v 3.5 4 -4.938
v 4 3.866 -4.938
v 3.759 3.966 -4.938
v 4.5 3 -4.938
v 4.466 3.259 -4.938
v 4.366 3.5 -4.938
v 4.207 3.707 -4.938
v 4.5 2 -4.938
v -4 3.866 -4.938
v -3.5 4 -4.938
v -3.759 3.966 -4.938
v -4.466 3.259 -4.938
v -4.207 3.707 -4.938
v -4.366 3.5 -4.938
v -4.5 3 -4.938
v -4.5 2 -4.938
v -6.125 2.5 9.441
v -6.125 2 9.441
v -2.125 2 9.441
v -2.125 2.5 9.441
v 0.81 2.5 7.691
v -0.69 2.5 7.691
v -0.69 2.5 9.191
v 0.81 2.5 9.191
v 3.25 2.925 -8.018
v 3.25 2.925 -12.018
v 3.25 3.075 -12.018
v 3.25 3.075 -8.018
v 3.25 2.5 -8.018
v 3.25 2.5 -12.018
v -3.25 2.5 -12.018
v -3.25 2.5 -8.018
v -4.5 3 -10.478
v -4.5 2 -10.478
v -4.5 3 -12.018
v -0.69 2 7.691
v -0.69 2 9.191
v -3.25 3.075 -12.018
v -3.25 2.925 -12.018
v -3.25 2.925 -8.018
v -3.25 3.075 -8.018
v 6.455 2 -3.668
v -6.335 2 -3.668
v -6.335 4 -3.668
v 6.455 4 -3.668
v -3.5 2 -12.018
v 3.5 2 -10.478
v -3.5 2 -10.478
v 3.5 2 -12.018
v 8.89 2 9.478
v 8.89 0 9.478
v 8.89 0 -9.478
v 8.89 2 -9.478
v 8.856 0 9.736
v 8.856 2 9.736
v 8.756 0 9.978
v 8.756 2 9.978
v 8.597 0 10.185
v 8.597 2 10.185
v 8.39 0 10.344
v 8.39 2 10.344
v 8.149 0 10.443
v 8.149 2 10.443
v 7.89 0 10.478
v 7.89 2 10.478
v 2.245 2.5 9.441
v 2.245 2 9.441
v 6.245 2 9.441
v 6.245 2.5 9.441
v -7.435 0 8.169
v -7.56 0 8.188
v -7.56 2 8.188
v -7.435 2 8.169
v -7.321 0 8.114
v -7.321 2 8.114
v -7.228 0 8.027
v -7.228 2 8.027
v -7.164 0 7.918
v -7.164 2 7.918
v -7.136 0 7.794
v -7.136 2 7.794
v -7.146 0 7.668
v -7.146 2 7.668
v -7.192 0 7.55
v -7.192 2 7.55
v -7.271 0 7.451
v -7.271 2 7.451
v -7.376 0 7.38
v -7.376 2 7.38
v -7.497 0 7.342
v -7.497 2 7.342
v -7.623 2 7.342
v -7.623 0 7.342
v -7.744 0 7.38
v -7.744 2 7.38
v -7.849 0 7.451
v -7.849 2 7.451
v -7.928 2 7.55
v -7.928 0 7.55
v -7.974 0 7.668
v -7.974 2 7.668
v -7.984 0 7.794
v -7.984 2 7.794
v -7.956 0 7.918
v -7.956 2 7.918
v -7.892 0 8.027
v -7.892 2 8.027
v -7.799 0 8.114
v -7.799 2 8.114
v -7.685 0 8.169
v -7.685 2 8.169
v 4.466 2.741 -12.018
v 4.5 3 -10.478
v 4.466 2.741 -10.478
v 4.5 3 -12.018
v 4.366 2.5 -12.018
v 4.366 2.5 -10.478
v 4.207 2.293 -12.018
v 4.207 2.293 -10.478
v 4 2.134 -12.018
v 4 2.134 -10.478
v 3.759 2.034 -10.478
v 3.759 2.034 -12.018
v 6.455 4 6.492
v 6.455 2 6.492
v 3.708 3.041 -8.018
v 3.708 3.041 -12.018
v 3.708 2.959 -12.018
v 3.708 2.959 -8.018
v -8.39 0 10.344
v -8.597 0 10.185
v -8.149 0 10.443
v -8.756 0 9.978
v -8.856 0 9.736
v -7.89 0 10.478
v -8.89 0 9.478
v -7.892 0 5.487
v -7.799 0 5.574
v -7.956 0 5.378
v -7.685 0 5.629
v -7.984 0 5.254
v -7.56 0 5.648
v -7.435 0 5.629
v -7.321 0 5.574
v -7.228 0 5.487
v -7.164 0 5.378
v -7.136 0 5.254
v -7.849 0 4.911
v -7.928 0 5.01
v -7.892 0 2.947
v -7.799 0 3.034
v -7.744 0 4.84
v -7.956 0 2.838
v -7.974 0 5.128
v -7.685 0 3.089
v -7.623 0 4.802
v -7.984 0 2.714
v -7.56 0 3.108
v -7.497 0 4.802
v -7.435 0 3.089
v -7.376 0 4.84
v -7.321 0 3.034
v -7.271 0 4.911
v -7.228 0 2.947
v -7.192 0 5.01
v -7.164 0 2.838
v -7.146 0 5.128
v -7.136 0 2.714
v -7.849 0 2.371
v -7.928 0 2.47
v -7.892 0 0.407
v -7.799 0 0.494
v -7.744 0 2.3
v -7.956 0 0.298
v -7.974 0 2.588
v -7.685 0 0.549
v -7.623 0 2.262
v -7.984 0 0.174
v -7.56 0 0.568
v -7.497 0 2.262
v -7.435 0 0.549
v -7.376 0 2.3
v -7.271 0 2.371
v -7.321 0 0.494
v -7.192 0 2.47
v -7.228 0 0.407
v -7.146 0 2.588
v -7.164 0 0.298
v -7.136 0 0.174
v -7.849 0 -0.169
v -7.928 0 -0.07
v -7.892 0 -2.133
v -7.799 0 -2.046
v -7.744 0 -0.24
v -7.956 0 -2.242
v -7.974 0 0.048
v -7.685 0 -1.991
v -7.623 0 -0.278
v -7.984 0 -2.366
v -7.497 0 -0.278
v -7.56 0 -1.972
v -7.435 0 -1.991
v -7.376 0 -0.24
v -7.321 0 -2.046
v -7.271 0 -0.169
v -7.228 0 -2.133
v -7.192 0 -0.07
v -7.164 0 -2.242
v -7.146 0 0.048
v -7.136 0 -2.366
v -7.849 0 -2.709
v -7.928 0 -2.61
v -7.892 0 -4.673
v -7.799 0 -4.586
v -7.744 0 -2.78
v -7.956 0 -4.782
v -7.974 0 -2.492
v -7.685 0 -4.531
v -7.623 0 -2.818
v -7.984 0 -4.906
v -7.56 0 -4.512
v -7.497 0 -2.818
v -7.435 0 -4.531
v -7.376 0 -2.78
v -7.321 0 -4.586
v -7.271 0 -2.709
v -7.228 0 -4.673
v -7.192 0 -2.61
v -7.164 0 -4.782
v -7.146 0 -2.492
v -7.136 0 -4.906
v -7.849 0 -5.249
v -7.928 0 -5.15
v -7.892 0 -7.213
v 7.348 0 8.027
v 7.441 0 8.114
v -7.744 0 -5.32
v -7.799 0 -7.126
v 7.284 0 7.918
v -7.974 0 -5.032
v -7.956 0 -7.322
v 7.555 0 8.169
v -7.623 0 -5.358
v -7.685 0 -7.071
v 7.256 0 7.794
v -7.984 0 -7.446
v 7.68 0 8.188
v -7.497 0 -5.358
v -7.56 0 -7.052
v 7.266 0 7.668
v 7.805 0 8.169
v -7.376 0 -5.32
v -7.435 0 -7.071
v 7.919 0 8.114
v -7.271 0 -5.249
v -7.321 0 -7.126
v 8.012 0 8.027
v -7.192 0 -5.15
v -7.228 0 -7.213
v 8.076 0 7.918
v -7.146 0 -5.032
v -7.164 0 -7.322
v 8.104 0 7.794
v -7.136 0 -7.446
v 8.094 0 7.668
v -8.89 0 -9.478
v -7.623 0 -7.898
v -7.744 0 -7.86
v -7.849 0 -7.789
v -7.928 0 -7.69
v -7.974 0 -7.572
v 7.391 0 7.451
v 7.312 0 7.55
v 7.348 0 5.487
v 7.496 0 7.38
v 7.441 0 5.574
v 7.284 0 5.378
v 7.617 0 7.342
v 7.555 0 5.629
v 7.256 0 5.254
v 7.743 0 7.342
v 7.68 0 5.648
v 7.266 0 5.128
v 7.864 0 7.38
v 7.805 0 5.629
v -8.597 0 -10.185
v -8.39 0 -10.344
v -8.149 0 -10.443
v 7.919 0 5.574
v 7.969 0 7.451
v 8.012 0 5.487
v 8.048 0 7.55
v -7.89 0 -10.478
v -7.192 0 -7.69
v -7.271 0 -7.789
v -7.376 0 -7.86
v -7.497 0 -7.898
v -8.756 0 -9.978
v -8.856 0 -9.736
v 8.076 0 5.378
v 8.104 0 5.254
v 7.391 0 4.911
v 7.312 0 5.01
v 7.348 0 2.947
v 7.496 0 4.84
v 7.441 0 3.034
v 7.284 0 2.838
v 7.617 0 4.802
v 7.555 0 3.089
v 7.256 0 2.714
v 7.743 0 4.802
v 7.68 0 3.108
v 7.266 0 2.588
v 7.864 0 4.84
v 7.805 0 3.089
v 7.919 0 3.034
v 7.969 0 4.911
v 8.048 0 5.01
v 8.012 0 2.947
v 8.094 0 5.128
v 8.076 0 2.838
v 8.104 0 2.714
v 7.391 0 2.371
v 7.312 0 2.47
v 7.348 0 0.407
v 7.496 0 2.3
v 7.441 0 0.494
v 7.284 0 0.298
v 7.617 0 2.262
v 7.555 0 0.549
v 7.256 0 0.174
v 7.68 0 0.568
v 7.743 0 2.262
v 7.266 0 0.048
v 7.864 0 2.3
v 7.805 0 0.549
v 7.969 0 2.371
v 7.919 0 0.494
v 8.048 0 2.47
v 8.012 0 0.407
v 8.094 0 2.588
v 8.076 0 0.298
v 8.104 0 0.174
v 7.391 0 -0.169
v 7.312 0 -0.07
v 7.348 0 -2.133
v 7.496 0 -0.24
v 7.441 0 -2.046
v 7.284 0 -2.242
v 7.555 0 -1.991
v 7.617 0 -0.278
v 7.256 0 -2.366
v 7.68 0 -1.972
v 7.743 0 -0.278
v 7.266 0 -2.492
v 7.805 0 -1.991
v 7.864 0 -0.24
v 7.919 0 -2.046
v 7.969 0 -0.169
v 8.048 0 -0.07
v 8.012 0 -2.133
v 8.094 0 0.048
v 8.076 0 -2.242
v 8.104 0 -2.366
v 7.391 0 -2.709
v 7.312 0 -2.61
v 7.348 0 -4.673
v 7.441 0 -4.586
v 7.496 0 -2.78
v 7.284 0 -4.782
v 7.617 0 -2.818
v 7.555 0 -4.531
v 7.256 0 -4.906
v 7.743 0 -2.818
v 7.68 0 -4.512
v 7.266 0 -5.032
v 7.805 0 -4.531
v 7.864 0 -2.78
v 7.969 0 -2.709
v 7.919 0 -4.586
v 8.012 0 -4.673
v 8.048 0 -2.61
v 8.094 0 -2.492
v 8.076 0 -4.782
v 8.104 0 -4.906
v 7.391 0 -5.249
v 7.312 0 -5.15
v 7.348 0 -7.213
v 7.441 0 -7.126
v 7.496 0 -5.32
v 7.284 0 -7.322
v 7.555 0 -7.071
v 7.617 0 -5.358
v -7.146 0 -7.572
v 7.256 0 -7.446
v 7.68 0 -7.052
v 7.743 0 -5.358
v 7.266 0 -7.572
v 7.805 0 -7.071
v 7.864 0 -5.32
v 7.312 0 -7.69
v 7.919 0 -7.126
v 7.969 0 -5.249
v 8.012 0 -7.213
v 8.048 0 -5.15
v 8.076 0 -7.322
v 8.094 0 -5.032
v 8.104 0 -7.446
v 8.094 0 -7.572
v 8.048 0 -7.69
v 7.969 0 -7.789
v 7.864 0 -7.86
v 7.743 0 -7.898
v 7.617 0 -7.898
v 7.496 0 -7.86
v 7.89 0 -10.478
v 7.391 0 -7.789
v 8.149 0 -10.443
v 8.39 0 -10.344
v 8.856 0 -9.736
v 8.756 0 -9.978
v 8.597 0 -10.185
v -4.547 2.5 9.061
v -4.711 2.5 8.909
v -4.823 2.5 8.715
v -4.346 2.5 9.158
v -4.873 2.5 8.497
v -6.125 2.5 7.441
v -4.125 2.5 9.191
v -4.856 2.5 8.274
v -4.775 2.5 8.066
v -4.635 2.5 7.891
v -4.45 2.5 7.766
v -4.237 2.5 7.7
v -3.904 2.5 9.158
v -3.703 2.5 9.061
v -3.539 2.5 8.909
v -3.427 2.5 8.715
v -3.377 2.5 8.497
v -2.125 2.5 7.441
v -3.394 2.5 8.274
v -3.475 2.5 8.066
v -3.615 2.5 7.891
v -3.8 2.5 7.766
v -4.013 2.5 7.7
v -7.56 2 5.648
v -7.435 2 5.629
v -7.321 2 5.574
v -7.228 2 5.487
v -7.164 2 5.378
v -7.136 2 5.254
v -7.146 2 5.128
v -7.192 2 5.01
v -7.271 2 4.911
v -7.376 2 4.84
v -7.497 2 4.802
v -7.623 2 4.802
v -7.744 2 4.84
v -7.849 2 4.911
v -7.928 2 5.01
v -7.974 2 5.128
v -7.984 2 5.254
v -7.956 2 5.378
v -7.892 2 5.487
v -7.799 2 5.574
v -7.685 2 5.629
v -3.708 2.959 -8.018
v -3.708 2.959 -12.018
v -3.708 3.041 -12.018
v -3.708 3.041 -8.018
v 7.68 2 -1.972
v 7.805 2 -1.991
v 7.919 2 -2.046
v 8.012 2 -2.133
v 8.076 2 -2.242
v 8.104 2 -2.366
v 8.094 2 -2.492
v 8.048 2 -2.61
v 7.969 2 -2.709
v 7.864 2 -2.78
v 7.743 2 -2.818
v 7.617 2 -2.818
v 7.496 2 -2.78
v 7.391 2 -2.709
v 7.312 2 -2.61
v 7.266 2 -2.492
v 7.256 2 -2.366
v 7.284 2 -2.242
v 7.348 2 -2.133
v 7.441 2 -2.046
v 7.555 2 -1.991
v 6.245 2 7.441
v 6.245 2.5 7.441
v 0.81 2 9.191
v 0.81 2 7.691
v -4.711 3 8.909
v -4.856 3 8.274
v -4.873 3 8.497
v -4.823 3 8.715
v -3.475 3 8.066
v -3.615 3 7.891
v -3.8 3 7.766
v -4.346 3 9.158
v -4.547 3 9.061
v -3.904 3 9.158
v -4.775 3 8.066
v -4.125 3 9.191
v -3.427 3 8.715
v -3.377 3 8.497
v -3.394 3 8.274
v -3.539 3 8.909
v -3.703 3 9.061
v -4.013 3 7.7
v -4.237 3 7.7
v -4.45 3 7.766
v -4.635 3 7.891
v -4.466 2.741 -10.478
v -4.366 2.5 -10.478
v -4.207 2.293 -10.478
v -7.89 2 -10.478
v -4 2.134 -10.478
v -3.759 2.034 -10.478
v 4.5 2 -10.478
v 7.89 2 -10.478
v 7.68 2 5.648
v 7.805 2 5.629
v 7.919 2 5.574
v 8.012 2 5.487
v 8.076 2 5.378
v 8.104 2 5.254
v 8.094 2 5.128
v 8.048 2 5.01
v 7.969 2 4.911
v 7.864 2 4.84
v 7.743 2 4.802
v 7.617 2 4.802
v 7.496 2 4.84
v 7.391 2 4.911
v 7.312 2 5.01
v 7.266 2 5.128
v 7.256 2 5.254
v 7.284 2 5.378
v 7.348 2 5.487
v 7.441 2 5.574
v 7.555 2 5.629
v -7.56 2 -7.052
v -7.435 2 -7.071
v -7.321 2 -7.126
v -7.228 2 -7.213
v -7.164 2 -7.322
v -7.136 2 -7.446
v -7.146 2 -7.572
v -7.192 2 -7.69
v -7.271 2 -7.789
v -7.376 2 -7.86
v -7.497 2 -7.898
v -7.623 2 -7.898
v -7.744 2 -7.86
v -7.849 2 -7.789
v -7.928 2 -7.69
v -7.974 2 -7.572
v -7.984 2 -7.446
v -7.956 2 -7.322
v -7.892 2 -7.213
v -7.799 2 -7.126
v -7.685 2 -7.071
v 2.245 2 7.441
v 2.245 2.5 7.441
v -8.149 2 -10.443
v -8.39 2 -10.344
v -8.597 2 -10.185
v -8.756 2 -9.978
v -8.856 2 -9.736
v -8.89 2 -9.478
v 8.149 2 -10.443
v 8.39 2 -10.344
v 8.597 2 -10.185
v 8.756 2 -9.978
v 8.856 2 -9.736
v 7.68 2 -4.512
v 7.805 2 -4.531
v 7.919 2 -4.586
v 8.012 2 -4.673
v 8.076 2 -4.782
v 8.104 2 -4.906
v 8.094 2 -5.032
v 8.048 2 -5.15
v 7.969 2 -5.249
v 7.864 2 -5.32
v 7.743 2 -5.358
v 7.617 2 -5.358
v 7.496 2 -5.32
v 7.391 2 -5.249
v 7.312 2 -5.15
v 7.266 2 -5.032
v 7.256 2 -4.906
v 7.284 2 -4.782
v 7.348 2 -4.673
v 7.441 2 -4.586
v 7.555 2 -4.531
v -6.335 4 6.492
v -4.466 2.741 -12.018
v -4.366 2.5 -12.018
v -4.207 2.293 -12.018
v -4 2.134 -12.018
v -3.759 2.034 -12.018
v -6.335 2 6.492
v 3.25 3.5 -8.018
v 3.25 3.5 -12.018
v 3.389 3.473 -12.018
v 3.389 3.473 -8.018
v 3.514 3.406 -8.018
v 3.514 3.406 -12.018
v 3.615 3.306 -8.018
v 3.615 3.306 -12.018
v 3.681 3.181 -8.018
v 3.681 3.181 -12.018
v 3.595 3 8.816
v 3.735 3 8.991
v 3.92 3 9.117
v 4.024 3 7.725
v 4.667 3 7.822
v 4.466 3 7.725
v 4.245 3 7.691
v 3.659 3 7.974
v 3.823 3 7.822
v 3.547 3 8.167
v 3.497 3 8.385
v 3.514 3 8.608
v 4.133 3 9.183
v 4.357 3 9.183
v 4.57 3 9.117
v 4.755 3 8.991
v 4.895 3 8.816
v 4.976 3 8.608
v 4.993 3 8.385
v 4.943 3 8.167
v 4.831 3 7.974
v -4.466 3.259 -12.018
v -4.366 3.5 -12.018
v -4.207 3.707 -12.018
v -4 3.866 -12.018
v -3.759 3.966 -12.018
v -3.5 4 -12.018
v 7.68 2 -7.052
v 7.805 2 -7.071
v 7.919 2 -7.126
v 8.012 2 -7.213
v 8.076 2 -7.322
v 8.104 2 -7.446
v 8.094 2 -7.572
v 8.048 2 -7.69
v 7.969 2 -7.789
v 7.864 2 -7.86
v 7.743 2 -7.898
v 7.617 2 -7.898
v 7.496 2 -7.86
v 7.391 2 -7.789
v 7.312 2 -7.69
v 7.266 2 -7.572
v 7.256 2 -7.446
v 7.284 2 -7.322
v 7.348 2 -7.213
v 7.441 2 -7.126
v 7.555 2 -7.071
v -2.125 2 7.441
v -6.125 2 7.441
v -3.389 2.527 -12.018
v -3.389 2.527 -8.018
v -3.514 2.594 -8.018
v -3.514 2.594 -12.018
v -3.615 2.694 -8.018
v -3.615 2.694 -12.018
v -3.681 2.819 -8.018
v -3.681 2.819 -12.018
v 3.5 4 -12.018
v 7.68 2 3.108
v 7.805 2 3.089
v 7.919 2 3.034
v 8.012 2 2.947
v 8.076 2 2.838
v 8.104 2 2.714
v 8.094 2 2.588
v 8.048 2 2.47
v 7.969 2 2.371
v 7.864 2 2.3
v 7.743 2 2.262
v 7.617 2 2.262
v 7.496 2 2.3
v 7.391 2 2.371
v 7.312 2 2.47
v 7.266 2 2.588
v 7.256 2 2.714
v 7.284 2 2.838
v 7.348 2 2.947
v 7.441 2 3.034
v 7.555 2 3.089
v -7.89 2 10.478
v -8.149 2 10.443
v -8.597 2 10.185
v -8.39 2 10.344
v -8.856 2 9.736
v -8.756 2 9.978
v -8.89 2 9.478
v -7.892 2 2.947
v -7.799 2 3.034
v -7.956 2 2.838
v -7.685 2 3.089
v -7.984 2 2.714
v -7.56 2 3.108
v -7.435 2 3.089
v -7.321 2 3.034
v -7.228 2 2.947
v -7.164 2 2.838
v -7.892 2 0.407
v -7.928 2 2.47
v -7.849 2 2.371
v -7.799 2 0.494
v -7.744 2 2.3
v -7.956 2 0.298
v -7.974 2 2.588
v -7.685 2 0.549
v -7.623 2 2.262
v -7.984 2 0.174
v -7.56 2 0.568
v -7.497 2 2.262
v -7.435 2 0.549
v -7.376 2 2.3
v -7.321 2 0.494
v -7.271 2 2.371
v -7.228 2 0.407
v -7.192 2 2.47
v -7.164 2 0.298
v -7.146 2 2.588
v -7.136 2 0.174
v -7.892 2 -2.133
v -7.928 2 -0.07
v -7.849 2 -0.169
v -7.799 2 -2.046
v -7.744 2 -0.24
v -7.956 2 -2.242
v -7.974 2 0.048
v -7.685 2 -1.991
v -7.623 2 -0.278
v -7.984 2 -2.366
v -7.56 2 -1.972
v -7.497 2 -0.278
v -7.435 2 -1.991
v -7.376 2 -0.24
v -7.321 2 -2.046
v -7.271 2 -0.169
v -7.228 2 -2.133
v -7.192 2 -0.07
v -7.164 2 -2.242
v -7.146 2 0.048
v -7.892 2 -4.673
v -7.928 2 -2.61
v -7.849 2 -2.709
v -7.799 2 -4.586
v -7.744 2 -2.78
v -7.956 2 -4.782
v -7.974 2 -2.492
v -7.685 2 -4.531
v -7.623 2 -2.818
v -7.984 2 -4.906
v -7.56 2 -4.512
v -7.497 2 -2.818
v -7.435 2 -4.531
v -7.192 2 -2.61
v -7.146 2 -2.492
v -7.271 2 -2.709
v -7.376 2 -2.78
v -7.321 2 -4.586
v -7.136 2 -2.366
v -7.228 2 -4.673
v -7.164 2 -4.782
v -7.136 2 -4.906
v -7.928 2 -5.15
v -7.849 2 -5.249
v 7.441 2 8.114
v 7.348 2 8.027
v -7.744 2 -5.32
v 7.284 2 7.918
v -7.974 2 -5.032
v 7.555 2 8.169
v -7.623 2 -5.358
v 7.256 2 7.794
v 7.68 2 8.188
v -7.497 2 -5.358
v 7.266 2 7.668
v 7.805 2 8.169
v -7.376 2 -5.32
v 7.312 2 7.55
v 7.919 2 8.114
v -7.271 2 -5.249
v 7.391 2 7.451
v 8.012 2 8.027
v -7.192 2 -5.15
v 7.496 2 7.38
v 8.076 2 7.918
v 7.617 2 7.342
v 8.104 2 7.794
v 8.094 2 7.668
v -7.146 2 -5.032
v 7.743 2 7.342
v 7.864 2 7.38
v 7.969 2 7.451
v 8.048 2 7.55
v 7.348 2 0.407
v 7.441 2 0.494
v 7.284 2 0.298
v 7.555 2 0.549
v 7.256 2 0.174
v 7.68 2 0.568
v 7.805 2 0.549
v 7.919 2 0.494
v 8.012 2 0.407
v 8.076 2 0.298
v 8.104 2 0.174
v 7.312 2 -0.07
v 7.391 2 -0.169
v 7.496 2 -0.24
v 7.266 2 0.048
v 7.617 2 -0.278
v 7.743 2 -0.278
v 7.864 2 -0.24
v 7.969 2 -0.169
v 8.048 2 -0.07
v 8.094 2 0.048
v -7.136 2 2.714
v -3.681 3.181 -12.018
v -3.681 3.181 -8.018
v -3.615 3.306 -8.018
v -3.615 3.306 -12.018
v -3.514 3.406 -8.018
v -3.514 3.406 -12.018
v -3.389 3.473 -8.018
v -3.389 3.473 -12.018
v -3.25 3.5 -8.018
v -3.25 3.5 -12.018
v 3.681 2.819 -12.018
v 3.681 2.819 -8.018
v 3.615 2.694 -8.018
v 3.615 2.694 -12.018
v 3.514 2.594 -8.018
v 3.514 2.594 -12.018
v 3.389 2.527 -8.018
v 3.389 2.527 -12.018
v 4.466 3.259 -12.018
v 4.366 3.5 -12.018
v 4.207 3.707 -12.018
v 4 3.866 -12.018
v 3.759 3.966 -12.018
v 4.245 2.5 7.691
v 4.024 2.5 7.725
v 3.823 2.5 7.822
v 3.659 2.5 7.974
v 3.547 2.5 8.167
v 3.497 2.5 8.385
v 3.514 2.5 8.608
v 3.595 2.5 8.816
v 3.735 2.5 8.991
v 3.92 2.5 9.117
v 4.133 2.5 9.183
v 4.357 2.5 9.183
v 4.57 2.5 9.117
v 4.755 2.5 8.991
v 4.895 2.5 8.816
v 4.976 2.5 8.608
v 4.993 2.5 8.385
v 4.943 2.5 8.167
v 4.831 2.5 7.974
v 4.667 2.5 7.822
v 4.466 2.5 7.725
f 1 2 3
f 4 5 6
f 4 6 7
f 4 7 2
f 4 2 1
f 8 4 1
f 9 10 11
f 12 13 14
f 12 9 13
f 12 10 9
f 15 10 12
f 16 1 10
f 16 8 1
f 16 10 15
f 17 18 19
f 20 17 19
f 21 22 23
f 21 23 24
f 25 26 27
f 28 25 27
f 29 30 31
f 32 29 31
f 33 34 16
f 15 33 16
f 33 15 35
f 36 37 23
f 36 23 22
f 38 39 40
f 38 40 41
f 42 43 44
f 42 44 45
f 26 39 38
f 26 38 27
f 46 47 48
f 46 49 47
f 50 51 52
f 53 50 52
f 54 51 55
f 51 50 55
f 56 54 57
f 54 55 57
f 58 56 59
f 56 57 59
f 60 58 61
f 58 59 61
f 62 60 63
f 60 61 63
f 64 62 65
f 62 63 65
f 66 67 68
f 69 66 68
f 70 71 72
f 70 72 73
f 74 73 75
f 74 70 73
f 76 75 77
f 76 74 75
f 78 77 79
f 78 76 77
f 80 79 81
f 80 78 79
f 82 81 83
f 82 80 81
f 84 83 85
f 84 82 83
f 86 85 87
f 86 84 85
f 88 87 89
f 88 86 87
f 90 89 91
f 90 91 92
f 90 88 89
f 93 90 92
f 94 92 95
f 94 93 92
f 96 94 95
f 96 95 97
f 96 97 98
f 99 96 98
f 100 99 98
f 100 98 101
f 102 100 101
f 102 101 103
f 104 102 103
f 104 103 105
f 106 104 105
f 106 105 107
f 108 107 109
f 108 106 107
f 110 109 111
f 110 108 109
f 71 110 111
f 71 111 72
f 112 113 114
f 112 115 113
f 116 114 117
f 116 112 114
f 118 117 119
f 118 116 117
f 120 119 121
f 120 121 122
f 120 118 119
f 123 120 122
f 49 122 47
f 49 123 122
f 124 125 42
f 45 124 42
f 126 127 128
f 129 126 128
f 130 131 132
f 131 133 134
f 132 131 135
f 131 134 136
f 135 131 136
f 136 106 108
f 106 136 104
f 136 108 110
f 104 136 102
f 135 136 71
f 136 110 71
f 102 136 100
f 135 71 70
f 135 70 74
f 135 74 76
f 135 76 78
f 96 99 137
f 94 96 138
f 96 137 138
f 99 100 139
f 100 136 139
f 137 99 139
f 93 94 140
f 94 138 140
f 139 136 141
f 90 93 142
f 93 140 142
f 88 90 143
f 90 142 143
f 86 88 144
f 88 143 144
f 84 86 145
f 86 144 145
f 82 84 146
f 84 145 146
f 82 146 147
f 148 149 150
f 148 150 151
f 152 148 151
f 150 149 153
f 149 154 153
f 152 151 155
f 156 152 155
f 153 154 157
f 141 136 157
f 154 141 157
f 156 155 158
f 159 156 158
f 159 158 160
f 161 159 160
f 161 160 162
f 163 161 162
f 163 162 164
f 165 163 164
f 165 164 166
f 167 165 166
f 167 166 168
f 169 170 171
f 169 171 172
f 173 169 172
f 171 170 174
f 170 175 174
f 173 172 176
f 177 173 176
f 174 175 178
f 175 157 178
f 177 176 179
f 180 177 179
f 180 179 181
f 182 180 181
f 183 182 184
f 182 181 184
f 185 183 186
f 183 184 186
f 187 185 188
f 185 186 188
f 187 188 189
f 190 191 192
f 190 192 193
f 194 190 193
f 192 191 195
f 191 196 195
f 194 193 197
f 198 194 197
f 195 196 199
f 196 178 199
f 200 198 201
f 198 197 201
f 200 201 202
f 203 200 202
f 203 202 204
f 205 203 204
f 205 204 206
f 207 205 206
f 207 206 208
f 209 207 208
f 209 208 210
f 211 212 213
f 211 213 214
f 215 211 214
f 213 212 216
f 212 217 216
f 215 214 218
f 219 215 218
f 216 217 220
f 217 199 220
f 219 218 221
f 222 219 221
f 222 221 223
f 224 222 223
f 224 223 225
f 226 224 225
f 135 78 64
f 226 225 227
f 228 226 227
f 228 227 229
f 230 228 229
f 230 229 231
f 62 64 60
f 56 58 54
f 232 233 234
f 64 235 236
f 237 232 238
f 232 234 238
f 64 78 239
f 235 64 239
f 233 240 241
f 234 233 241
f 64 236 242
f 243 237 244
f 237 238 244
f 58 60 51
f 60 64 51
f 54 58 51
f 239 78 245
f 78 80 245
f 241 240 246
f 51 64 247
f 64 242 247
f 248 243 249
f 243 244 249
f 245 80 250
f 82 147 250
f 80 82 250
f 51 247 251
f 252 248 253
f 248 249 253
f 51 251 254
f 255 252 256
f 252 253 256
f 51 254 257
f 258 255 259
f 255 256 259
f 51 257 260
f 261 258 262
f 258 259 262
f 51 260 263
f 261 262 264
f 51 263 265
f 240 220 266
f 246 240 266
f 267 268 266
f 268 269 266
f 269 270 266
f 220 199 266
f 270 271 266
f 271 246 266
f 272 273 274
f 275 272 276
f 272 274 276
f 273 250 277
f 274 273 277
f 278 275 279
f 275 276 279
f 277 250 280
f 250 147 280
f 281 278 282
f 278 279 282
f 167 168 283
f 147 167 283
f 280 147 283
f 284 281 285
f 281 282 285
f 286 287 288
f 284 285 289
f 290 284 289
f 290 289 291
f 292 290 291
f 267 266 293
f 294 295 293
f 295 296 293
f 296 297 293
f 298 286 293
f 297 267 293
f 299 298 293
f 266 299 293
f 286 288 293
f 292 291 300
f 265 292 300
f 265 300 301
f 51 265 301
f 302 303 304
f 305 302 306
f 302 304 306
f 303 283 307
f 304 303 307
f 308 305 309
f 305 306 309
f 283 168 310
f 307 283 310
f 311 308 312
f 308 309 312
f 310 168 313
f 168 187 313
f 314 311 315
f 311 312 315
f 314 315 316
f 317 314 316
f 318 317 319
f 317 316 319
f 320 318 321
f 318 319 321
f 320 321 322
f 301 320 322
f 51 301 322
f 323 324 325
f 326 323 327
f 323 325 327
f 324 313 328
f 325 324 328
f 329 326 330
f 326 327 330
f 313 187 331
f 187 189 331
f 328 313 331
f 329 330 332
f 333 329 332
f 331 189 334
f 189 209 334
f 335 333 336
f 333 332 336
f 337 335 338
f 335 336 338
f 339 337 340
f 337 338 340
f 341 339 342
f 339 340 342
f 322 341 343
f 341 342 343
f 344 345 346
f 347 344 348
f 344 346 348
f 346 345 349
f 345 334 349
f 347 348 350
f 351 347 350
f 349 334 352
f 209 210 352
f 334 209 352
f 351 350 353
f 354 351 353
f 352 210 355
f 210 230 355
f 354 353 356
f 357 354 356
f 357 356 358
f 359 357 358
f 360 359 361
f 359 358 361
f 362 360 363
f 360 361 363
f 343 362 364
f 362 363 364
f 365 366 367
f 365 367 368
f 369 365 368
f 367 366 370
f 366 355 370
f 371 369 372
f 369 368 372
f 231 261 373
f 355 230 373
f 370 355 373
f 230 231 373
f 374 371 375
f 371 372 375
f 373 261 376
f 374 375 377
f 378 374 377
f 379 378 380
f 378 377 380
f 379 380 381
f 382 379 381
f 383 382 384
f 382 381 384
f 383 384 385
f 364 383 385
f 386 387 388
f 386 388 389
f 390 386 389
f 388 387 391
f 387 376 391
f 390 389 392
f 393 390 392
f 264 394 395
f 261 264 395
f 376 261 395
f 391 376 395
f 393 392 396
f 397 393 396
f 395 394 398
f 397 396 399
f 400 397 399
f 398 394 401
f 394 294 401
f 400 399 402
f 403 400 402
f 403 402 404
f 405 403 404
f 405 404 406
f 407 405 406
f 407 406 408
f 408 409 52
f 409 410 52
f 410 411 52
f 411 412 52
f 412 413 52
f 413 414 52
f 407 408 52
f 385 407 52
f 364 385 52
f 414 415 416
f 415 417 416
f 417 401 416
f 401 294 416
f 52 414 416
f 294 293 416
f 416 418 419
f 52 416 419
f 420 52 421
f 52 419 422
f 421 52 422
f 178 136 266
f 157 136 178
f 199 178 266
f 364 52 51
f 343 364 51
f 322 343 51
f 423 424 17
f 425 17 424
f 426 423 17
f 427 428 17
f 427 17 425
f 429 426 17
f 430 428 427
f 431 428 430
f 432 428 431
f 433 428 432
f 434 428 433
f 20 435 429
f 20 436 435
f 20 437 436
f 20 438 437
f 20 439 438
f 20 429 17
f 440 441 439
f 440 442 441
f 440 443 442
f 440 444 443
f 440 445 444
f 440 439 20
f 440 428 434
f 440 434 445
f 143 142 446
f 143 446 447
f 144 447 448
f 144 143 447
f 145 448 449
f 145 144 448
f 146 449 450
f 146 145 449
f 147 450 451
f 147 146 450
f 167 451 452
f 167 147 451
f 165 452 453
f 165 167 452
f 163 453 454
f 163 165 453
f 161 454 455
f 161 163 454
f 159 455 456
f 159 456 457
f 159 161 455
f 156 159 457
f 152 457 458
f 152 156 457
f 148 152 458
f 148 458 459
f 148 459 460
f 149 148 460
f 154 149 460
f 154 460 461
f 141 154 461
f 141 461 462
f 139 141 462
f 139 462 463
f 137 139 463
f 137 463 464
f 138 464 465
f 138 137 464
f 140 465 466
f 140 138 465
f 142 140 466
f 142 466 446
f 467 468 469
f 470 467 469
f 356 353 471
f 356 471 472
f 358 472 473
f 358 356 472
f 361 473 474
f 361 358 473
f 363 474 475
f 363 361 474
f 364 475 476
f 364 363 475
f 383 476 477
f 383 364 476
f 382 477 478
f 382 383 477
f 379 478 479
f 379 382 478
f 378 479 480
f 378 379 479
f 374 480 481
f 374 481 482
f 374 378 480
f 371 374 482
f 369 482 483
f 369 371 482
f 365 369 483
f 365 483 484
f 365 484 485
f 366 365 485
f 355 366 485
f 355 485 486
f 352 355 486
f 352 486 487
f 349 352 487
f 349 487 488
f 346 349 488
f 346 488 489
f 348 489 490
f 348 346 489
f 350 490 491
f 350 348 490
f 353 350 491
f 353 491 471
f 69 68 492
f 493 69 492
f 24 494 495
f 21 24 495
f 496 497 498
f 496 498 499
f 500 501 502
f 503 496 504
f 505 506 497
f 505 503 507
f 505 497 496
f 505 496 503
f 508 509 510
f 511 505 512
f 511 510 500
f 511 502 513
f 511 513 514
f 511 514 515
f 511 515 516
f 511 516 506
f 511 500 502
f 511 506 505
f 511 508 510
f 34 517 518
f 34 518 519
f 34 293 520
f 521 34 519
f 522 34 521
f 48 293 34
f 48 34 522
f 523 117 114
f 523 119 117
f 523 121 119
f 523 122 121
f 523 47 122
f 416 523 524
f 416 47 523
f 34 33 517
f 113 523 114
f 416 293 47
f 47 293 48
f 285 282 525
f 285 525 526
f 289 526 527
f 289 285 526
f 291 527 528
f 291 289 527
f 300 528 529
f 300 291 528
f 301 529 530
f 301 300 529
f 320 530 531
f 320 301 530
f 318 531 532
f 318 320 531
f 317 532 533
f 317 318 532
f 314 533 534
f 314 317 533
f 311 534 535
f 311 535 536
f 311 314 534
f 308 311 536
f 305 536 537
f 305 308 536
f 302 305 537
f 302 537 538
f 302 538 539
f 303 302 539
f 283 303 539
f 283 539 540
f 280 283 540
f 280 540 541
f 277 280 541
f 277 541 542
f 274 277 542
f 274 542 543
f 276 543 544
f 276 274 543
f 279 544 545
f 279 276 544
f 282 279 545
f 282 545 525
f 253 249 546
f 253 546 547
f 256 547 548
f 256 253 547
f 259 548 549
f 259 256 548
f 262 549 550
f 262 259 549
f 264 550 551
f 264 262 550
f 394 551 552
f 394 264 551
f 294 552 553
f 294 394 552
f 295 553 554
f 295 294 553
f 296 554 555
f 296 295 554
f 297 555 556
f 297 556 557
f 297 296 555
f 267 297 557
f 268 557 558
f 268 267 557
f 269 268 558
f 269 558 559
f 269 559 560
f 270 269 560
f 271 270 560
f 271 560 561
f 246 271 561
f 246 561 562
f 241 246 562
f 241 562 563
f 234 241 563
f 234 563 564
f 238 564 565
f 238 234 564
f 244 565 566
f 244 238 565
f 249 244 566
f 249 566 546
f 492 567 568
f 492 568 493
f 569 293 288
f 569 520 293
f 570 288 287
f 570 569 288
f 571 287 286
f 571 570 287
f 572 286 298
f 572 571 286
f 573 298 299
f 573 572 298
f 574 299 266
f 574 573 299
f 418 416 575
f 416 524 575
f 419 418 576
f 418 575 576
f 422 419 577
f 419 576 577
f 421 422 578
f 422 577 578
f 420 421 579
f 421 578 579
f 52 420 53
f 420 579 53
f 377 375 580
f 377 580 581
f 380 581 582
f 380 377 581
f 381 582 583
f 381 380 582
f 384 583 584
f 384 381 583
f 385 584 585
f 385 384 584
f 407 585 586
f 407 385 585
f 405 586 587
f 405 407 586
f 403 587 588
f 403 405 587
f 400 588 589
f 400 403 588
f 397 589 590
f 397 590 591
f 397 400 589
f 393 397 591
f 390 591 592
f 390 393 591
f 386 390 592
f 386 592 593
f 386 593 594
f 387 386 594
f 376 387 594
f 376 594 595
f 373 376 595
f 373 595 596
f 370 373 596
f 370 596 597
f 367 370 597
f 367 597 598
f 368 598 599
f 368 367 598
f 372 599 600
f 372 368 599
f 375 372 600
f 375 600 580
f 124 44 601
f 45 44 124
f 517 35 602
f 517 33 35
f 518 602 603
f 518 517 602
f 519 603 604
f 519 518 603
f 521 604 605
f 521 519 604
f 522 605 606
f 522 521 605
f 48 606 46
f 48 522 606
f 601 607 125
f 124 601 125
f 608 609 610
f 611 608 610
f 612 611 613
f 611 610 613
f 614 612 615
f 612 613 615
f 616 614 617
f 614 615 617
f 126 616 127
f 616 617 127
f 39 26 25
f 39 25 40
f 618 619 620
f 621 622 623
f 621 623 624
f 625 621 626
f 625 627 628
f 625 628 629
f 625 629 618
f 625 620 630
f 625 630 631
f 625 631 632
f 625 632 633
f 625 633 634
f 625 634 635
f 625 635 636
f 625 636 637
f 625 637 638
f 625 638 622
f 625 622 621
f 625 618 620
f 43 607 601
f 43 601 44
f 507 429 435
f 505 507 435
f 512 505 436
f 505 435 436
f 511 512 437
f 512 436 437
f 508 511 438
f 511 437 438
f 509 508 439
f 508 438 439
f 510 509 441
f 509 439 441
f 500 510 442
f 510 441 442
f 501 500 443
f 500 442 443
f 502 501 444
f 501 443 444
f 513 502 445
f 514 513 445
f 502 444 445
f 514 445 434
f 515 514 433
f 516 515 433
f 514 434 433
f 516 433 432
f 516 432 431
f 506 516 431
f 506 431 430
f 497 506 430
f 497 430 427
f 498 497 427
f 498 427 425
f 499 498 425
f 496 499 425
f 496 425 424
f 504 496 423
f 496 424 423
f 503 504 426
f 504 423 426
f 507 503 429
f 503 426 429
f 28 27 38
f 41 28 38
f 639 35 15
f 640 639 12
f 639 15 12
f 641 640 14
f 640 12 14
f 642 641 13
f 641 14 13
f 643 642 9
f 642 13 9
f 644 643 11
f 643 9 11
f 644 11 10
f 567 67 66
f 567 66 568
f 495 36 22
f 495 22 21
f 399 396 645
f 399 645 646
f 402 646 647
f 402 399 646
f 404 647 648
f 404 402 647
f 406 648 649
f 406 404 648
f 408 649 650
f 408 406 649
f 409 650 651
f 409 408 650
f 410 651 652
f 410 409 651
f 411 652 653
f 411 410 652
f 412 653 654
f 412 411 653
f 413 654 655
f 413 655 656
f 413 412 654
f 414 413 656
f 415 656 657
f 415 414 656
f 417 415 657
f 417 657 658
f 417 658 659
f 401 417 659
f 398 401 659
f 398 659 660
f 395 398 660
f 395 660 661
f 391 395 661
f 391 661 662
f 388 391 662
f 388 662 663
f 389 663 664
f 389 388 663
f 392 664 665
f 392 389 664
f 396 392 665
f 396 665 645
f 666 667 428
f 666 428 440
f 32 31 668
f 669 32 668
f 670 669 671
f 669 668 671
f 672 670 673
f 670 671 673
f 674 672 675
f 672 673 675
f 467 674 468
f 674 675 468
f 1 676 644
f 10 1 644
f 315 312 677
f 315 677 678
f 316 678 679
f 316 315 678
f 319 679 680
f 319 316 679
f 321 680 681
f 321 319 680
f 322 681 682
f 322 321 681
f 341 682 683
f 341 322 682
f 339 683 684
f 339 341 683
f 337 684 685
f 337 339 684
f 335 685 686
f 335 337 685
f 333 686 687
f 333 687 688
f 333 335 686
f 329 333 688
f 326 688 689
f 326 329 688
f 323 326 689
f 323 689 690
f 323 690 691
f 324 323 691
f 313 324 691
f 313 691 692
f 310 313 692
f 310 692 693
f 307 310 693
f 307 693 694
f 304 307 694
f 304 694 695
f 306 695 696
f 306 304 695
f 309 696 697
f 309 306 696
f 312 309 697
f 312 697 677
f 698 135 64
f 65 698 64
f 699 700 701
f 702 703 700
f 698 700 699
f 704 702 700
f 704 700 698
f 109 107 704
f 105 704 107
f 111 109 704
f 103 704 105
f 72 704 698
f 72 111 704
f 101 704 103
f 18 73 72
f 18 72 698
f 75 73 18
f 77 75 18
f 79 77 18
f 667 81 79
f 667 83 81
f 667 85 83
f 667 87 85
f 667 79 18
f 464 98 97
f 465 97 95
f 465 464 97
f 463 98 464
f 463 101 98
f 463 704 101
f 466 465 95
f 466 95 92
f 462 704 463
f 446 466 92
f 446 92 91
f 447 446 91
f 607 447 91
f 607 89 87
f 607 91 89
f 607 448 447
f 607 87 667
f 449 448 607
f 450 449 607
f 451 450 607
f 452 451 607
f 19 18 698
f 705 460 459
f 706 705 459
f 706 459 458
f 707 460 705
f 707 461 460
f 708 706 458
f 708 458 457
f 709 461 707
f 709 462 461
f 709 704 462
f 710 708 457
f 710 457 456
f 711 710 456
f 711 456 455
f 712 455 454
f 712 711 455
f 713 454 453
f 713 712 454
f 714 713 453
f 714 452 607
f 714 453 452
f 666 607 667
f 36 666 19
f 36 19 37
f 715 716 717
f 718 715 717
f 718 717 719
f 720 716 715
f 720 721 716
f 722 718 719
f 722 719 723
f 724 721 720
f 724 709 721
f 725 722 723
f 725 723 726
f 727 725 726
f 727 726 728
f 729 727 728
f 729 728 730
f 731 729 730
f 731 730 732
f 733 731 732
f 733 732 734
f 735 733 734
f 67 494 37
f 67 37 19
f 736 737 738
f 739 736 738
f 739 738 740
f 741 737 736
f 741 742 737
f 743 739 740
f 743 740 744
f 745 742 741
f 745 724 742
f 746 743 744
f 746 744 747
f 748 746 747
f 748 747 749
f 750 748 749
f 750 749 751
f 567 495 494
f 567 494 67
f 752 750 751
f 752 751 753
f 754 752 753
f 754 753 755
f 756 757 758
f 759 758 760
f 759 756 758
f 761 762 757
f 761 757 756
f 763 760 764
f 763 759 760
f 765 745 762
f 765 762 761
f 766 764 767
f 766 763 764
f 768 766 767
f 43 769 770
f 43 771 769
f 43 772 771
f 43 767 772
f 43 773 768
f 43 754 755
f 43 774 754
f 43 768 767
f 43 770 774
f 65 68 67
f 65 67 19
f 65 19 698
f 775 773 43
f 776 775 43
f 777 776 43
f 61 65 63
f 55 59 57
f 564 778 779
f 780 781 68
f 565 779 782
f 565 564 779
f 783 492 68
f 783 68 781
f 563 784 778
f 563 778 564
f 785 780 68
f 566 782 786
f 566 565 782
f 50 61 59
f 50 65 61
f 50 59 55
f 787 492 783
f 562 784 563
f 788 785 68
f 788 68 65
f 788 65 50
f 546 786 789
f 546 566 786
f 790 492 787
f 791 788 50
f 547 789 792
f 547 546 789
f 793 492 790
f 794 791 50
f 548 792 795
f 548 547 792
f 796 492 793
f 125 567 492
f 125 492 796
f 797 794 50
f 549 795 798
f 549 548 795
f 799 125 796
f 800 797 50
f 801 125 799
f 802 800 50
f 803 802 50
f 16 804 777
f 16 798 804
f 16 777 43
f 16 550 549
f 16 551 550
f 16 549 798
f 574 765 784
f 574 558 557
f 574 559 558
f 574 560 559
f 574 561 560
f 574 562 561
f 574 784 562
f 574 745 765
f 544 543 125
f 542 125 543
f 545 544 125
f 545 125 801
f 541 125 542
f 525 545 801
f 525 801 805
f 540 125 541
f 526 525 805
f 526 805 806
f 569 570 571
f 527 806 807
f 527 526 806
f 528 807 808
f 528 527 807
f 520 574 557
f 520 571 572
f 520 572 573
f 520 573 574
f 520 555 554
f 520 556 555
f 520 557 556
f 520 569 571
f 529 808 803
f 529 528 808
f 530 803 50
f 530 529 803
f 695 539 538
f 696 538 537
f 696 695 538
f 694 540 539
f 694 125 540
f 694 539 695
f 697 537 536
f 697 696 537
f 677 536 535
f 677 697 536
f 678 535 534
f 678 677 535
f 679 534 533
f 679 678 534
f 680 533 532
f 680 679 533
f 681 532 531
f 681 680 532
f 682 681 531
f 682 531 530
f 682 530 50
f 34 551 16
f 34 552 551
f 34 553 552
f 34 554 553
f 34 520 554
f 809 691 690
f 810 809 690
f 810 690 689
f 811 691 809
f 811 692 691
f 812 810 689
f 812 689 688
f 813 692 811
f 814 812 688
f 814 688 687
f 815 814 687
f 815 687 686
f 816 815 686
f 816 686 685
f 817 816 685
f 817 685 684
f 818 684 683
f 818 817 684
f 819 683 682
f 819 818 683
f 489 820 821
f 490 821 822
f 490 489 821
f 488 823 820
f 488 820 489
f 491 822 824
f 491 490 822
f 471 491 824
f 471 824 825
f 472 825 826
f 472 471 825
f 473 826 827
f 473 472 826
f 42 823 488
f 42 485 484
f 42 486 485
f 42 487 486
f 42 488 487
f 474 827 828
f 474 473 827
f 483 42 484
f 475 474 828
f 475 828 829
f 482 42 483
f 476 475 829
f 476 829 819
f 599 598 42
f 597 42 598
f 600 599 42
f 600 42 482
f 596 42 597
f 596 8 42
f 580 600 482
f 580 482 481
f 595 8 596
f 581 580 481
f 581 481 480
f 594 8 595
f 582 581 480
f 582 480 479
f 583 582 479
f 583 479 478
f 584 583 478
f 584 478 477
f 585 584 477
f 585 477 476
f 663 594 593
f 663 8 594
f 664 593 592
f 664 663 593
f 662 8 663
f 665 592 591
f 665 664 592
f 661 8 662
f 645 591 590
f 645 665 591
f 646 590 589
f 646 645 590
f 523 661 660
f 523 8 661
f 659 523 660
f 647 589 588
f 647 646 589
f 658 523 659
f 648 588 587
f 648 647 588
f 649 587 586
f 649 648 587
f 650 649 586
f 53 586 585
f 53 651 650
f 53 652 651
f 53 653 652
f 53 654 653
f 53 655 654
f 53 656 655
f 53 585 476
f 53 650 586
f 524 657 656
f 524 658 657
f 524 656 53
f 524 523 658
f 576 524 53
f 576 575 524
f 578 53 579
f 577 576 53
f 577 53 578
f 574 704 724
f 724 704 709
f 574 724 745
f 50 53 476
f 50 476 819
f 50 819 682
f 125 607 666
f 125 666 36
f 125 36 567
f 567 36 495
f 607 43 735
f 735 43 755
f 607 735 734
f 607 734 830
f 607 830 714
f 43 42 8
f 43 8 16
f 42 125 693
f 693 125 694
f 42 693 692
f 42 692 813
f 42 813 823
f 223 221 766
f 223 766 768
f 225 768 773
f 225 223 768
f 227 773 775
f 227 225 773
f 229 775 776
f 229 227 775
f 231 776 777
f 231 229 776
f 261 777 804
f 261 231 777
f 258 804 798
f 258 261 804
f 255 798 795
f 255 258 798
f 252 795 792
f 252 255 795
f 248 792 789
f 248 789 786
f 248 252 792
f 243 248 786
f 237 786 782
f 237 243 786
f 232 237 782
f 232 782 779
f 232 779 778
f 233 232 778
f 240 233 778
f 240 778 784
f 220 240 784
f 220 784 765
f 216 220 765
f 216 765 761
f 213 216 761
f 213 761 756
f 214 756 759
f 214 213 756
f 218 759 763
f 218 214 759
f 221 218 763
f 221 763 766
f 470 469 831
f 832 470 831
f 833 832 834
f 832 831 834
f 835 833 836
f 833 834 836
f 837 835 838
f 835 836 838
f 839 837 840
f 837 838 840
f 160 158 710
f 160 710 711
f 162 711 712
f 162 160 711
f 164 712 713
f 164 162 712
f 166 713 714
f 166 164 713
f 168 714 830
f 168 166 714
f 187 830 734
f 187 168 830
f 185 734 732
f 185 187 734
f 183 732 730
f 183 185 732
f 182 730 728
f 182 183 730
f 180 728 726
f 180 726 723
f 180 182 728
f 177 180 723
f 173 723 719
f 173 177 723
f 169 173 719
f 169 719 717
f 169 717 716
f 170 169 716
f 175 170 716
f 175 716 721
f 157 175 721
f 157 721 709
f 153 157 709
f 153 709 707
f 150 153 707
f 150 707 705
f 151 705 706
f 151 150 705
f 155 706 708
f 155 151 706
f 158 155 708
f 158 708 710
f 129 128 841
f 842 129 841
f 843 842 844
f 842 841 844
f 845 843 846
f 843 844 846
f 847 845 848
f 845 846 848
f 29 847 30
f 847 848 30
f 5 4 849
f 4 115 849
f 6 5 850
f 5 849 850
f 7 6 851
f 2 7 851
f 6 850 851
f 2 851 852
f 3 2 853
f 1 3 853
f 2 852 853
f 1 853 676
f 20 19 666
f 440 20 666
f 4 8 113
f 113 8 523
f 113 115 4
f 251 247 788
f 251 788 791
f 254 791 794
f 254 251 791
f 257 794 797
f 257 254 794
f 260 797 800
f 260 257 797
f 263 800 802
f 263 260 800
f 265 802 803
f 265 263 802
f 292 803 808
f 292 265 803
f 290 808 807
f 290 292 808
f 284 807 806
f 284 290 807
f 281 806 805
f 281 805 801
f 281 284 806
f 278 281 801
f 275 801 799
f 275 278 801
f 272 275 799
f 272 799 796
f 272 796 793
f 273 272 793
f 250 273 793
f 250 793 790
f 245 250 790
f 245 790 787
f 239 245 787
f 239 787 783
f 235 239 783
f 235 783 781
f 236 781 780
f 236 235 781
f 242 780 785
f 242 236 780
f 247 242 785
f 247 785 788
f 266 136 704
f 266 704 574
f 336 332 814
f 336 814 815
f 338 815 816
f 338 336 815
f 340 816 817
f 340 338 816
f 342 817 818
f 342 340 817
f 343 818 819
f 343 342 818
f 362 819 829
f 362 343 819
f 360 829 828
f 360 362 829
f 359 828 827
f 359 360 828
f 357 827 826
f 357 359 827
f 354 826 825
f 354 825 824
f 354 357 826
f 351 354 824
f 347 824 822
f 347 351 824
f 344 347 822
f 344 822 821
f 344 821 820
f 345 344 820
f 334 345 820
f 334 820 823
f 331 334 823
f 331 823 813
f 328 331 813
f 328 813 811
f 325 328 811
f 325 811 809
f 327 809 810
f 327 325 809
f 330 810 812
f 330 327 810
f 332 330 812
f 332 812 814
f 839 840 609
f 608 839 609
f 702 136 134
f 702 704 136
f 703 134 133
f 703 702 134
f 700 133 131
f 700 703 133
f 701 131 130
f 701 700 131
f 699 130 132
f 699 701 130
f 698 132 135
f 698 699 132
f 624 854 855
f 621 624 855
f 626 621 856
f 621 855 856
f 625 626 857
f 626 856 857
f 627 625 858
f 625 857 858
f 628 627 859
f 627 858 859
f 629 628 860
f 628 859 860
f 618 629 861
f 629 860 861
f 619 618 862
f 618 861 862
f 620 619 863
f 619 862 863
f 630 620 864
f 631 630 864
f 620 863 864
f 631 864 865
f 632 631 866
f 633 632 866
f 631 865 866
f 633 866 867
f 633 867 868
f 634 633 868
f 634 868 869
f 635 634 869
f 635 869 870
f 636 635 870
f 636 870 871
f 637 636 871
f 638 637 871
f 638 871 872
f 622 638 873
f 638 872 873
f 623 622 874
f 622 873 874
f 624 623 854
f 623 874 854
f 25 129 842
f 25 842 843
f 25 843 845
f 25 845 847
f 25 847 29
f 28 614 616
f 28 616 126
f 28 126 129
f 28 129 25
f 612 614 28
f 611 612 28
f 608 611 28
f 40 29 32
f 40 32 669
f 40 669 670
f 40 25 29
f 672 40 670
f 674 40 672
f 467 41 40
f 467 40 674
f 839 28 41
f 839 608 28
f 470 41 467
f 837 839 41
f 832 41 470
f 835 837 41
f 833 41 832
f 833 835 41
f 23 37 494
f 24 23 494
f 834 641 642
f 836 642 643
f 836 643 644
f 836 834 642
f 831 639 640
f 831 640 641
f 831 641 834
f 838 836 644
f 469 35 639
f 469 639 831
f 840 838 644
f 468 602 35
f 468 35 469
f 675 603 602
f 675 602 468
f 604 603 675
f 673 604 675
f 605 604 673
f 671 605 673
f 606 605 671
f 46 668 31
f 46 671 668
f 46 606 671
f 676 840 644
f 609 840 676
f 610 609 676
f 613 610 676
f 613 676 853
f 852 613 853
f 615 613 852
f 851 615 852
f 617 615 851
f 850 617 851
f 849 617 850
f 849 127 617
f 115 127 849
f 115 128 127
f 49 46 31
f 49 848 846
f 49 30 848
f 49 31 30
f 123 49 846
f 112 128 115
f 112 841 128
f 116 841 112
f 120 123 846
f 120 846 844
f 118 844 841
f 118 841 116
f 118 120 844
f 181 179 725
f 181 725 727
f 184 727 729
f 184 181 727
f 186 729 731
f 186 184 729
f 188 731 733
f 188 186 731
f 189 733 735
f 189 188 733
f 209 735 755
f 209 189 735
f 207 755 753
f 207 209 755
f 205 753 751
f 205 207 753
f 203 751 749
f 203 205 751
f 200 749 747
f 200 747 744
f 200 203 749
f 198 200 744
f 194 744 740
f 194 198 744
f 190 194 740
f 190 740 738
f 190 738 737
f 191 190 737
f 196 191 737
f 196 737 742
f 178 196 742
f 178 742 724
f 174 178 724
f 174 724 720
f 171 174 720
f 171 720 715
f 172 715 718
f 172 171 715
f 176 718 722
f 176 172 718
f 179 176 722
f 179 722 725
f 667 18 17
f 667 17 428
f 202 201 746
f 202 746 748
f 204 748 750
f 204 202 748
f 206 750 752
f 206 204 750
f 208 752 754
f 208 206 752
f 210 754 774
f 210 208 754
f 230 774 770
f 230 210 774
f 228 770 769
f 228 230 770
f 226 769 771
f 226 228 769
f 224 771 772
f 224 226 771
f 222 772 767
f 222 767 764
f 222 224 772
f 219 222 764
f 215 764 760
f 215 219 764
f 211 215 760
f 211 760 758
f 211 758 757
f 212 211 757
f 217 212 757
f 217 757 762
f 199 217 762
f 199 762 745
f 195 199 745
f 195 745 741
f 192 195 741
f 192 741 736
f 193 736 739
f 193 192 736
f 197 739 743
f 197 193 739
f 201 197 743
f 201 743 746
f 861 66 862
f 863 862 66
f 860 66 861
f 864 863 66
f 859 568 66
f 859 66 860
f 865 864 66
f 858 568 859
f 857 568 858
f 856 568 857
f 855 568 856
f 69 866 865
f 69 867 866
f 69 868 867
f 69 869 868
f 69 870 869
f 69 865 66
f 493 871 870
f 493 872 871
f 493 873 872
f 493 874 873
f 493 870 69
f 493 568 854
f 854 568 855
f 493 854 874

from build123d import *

# Parameters (mm, degrees)
ESQUISSE1_W             = 17.78
ESQUISSE1_H             = 20.955
ESQUISSE1_R             = 0.425
BOSS_EXTRU_1_DEPTH      = 2
BOSS_EXTRU_2_DEPTH      = 2
CONG_1_R                = 1
ESQUISSE3_W             = 6.499332414
ESQUISSE3_H             = 0.15
ENL_V_MAT_EXTRU_1_DEPTH = 4
CONG_2_R                = 1
ESQUISSE4_W             = 12.79
ESQUISSE4_H             = 10.16
BOSS_EXTRU_3_DEPTH      = 2
ESQUISSE5_W             = 4
ESQUISSE5_H             = 2
ESQUISSE5_W_2           = 1.5
ESQUISSE5_H_2           = 1.5
BOSS_EXTRU_4_DEPTH      = 0.5
ESQUISSE6_R             = 0.75
BOSS_EXTRU_5_DEPTH      = 0.5


with BuildPart() as part:
    # Esquisse1 → Boss.-Extru.1 (new body)
    with BuildSketch(Plane(origin=(0, 0, 0), x_dir=(1, 0, 0), z_dir=(0, 1, 0))):
        Rectangle(ESQUISSE1_W, ESQUISSE1_H)
        with Locations(Location((-7.56, 7.4775, 0), (0, 0, 270))):
            Circle(ESQUISSE1_R, mode=Mode.SUBTRACT)
        with Locations(Location((7.68, 7.4775, 0), (0, 0, 270))):
            Circle(ESQUISSE1_R, mode=Mode.SUBTRACT)
        with Locations(Location((7.68, 4.9375, 0), (0, 0, 270))):
            Circle(ESQUISSE1_R, mode=Mode.SUBTRACT)
        with Locations(Location((7.68, 2.3975, 0), (0, 0, 270))):
            Circle(ESQUISSE1_R, mode=Mode.SUBTRACT)
        with Locations(Location((7.68, -0.1425, 0), (0, 0, 270))):
            Circle(ESQUISSE1_R, mode=Mode.SUBTRACT)
        with Locations(Location((7.68, -2.6825, 0), (0, 0, 270))):
            Circle(ESQUISSE1_R, mode=Mode.SUBTRACT)
        with Locations(Location((7.68, -5.2225, 0), (0, 0, 270))):
            Circle(ESQUISSE1_R, mode=Mode.SUBTRACT)
        with Locations(Location((7.68, -7.7625, 0), (0, 0, 270))):
            Circle(ESQUISSE1_R, mode=Mode.SUBTRACT)
        with Locations(Location((-7.56, 4.9375, 0), (0, 0, 270))):
            Circle(ESQUISSE1_R, mode=Mode.SUBTRACT)
        with Locations(Location((-7.56, 2.3975, 0), (0, 0, 270))):
            Circle(ESQUISSE1_R, mode=Mode.SUBTRACT)
        with Locations(Location((-7.56, -0.1425, 0), (0, 0, 270))):
            Circle(ESQUISSE1_R, mode=Mode.SUBTRACT)
        with Locations(Location((-7.56, -2.6825, 0), (0, 0, 270))):
            Circle(ESQUISSE1_R, mode=Mode.SUBTRACT)
        with Locations(Location((-7.56, -5.2225, 0), (0, 0, 270))):
            Circle(ESQUISSE1_R, mode=Mode.SUBTRACT)
        with Locations(Location((-7.56, -7.7625, 0), (0, 0, 270))):
            Circle(ESQUISSE1_R, mode=Mode.SUBTRACT)
    extrude(amount=BOSS_EXTRU_1_DEPTH)

    # Esquisse2 → Boss.-Extru.2 (add)
    with BuildSketch(Plane(origin=(0, 2, 0), x_dir=(1, 0, 0), z_dir=(0, 1, 0))):
        Polygon((-4.5, 12.0175), (4.5, 12.0175), (4.5, 7.4775), (4.5, 4.9375), (-4.5, 4.9375), (-4.5, 7.4775), align=None)
    extrude(amount=BOSS_EXTRU_2_DEPTH)

    # Congé1
    cong_1_edges = [part.edges().sort_by_distance(p)[0] for p in [
        (-4.5, 2, -11.2475),
        (4.5, 2, -11.2475),
        (-4.5, 4, -8.4775),
        (4.5, 4, -8.4775),
    ]]
    fillet(cong_1_edges, radius=CONG_1_R - 0.0001)  # a hair under: the kernel refuses the full size

    # Esquisse3 → Enlèv. mat.-Extru.1 (cut)
    with BuildSketch(Plane(origin=(0, 0, -12.0175), x_dir=(-1, 0, 0), z_dir=(0, 0, -1))):
        with BuildLine():
            ThreePointArc((-3.708196785, 2.958530578), (-3.568140241, 2.640056544), (-3.249666207, 2.5))
            Line((-3.249666207, 2.5), (3.249666207, 2.5))
            ThreePointArc((3.249666207, 2.5), (3.568140241, 2.640056544), (3.708196785, 2.958530578))
            Line((3.708196785, 2.958530578), (3.708196785, 3))
            Line((3.708196785, 3), (3.708196785, 3.041469422))
            ThreePointArc((3.708196785, 3.041469422), (3.568140241, 3.359943456), (3.249666207, 3.5))
            Line((3.249666207, 3.5), (-3.249666207, 3.5))
            ThreePointArc((-3.249666207, 3.5), (-3.568140241, 3.359943456), (-3.708196785, 3.041469422))
            Line((-3.708196785, 3.041469422), (-3.708196785, 3))
            Line((-3.708196785, 3), (-3.708196785, 2.958530578))
        make_face()
        with Locations((0, 3)):
            Rectangle(ESQUISSE3_W, ESQUISSE3_H, mode=Mode.SUBTRACT)
    extrude(amount=-ENL_V_MAT_EXTRU_1_DEPTH, mode=Mode.SUBTRACT)

    # Congé2
    cong_2_edges = [part.edges().sort_by_distance(p)[0] for p in [
        (8.89, 1, 10.4775),
        (-8.89, 1, 10.4775),
        (-8.89, 1, -10.4775),
        (8.89, 1, -10.4775),
    ]]
    fillet(cong_2_edges, radius=CONG_2_R)

    # Esquisse4 → Boss.-Extru.3 (add)
    with BuildSketch(Plane(origin=(0, 2, 0), x_dir=(1, 0, 0), z_dir=(0, 1, 0))):
        with Locations((0.06, -1.4125)):
            Rectangle(ESQUISSE4_W, ESQUISSE4_H)
    extrude(amount=BOSS_EXTRU_3_DEPTH)

    # Esquisse5 → Boss.-Extru.4 (add)
    with BuildSketch(Plane(origin=(0, 2, 0), x_dir=(1, 0, 0), z_dir=(0, 1, 0))):
        with Locations((-4.125, -8.44125)):
            Rectangle(ESQUISSE5_W, ESQUISSE5_H)
        with Locations((4.245, -8.44125)):
            Rectangle(ESQUISSE5_W, ESQUISSE5_H)
        with Locations((0.06, -8.44125)):
            Rectangle(ESQUISSE5_W_2, ESQUISSE5_H_2)
    extrude(amount=BOSS_EXTRU_4_DEPTH)

    # Esquisse6 → Boss.-Extru.5 (add)
    with BuildSketch(Plane(origin=(0, 2.5, 0), x_dir=(1, 0, 0), z_dir=(0, 1, 0))):
        with Locations(Location((-4.125, -8.44125, 0), (0, 0, 270))):
            Circle(ESQUISSE6_R)
        with Locations(Location((4.245, -8.44125, 0), (0, 0, 90))):
            Circle(ESQUISSE6_R)
    extrude(amount=BOSS_EXTRU_5_DEPTH)


solid = part.part
